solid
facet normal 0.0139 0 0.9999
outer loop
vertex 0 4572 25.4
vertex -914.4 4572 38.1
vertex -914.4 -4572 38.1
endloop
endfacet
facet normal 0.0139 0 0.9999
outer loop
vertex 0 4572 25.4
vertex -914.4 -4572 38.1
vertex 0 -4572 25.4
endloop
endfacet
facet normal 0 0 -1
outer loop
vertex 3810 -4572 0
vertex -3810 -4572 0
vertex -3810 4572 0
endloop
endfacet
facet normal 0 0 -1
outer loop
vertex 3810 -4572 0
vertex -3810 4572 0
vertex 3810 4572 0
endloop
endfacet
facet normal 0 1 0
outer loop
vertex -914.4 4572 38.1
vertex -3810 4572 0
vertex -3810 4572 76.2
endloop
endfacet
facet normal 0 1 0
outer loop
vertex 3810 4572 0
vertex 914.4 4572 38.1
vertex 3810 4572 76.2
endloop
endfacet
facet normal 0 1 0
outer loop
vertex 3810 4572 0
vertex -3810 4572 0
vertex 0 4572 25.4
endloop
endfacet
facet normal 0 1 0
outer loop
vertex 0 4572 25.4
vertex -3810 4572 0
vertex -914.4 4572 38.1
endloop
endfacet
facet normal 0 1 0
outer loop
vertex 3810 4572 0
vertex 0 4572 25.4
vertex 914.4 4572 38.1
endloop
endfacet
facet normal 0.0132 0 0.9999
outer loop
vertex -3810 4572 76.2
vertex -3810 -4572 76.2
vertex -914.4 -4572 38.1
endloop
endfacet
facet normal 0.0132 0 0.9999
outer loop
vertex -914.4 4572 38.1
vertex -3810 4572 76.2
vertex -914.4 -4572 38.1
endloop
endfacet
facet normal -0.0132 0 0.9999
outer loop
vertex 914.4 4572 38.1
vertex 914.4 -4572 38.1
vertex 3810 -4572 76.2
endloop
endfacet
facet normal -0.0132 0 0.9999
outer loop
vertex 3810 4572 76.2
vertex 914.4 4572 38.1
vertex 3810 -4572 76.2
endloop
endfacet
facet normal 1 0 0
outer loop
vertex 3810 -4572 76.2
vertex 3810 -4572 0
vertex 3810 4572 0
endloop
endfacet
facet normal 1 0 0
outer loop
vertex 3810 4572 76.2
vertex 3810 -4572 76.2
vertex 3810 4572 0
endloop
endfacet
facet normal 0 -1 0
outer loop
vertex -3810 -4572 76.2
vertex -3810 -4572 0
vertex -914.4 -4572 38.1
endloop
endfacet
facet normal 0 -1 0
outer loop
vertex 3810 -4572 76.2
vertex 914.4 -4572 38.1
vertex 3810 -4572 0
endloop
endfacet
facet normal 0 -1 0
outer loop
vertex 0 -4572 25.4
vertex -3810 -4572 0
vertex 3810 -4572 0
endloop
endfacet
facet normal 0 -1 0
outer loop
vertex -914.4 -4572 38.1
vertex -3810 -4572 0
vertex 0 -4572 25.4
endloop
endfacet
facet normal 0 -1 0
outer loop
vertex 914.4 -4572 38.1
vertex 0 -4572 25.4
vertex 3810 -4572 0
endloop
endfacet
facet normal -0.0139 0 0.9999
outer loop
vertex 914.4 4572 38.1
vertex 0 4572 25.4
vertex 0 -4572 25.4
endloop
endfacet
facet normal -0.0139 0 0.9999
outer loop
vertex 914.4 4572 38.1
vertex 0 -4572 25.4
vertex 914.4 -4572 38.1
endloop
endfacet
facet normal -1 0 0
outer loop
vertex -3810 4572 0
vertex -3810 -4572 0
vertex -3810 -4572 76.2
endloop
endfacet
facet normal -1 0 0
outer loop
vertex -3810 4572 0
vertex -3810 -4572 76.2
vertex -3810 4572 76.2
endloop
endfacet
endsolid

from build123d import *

# Parameters (mm, degrees)
F0_W     = 7620
F0_H     = 9144
F1_DEPTH = 76.2
F3_DEPTH = 9144


with BuildPart() as f1:
    # F0 (on Top) → F1 (new body)
    with BuildSketch(Plane.XY):
        Rectangle(F0_W, F0_H)
    extrude(amount=F1_DEPTH)

    # F2 (on face) → F3 (cut, through all)
    with BuildSketch(Plane.XZ.offset(4572)):
        Polygon((914.4, 38.1), (3810, 76.2), (-3810, 76.2), (-914.4, 38.1), (0, 25.4), align=None)
    extrude(amount=-F3_DEPTH, mode=Mode.SUBTRACT)


solid = f1.part
